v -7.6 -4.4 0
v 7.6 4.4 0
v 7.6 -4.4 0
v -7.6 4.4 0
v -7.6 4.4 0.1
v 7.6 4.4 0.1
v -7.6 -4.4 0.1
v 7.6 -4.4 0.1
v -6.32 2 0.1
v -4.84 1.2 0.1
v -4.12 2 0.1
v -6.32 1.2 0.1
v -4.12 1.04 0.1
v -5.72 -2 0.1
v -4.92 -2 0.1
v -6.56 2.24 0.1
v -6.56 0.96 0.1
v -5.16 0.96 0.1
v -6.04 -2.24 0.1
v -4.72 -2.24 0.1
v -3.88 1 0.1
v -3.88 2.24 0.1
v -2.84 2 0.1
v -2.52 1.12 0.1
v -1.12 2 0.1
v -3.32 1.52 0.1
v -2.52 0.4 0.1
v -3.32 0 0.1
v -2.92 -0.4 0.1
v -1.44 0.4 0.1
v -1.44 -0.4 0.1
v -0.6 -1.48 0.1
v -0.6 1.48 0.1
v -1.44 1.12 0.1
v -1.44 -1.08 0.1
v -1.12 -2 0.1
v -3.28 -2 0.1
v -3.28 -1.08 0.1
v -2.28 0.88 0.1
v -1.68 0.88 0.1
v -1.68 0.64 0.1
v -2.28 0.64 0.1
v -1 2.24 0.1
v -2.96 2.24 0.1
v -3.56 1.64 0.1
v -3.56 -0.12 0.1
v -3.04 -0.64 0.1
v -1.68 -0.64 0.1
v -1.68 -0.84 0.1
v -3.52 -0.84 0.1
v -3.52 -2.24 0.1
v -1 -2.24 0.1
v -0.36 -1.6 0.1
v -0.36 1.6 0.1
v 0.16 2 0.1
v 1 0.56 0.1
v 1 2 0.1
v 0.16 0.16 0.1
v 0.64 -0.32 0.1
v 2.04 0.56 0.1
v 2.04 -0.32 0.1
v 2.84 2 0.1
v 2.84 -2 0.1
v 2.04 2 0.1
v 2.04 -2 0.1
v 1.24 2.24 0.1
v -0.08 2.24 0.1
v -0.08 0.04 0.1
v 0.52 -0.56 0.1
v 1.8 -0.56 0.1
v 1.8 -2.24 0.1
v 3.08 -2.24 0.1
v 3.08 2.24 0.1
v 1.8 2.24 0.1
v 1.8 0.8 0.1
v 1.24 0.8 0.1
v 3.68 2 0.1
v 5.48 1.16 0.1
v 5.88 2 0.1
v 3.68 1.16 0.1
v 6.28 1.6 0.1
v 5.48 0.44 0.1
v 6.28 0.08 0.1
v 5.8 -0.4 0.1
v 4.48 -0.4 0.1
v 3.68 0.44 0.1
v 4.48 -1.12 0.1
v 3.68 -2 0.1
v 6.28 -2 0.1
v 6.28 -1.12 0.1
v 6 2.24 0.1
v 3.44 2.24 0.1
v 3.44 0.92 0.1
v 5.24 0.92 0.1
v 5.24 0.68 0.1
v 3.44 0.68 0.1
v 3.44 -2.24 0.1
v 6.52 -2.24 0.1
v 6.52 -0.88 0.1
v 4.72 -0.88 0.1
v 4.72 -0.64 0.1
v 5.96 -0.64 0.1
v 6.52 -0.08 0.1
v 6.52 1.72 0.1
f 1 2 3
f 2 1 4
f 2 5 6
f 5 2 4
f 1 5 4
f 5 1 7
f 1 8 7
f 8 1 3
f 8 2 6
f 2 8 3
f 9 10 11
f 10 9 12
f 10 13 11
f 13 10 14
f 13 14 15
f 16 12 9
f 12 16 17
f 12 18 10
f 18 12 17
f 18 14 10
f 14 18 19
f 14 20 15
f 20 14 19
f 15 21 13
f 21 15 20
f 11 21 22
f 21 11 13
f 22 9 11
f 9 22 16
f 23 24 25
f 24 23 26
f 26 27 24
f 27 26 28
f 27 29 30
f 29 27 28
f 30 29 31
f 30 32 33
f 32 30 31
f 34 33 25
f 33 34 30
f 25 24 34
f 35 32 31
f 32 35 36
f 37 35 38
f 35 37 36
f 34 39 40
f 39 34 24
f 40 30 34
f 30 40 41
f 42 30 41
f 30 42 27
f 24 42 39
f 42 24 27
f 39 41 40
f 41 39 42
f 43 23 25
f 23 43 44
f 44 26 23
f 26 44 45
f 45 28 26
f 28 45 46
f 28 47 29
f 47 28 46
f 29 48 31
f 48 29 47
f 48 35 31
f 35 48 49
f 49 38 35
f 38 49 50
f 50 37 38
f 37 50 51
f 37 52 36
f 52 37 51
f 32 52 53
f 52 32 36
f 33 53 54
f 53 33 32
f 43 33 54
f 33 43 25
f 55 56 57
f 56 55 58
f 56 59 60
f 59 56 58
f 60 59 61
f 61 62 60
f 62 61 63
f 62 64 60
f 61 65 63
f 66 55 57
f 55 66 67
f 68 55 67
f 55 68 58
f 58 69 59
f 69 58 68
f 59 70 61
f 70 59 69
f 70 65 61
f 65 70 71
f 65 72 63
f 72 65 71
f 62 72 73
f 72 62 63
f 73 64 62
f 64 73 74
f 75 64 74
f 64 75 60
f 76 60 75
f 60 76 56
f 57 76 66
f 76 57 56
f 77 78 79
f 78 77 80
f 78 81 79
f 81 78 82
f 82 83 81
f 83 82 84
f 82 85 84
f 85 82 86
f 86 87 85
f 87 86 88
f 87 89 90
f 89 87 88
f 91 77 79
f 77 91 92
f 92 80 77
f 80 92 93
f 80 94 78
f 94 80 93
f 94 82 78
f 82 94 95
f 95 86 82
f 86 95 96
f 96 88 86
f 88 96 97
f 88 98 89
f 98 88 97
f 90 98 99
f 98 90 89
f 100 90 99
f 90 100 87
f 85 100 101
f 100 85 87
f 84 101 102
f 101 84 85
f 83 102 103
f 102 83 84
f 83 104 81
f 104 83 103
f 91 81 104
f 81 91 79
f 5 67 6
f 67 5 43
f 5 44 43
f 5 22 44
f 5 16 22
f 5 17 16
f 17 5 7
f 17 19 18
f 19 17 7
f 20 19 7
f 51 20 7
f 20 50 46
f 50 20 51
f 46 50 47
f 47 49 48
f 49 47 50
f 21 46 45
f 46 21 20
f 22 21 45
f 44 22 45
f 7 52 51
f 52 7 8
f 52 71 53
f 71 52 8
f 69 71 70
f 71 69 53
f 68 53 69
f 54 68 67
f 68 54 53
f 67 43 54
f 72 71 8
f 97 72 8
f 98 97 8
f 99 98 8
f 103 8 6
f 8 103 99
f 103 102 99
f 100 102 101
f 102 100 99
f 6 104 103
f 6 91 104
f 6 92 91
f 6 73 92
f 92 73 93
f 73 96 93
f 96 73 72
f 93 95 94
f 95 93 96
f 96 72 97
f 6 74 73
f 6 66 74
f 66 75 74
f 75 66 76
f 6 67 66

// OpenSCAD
// file: ../p/box5-12.scad
use <../lib.scad>
function ldraw_lib__box5_12() = [
// 0 Box with 5 Faces without Any Edges
// 0 Name: box5-12.dat
// 0 Author: Chris Dee [cwdee]
// 0 !LDRAW_ORG Primitive UPDATE 2009-02
// 0 !LICENSE Licensed under CC BY 4.0 : see CAreadme.txt
// 
// 0 BFC CERTIFY CCW
  [0,"BFC","CERTIFY"],
  [0,"BFC","CCW"],
// 
// 0 !HISTORY 2009-09-03 [PTadmin] Official Update 2009-02
// 
// 
// 4 16 1 1 1 1 1 -1 -1 1 -1 -1 1 1
  [4,16,1,1,1,1,1,-1,-1,1,-1,-1,1,1],
// 4 16 -1 0 1 1 0 1 1 1 1 -1 1 1
  [4,16,-1,0,1,1,0,1,1,1,1,-1,1,1],
// 4 16 -1 0 -1 -1 0 1 -1 1 1 -1 1 -1
  [4,16,-1,0,-1,-1,0,1,-1,1,1,-1,1,-1],
// 4 16 1 0 -1 -1 0 -1 -1 1 -1 1 1 -1
  [4,16,1,0,-1,-1,0,-1,-1,1,-1,1,1,-1],
// 4 16 1 0 1 1 0 -1 1 1 -1 1 1 1
  [4,16,1,0,1,1,0,-1,1,1,-1,1,1,1],
// 0
];
module ldraw_lib__box5_12(step=0, col=false, unit=2/5, alt=false, line=0.2, solid=!$preview)
    makepoly(ldraw_lib__box5_12(), step=step, col=col, unit=unit, alt=alt, line=line, solid=solid);
ldraw_lib__box5_12(line=0.2);
// main file
use <../lib.scad>
use <../p/box5-12.scad>
function ldraw_lib__4500817c() = [
// 0 Sticker  1.1 x  1.9 with White "7942" on Red Background
// 0 Name: 4500817c.dat
// 0 Author: Takeshi Takahashi [RainbowDolphin]
// 0 !LDRAW_ORG Part UPDATE 2025-05
// 0 !LICENSE Licensed under CC BY 4.0 : see CAreadme.txt
// 
// 0 BFC CERTIFY CCW
  [0,"BFC","CERTIFY"],
  [0,"BFC","CCW"],
// 
// 0 !KEYWORDS Fire car, Offroader, Pickup, Set 7942, truck
// 
// 0 !HISTORY 2025-05-28 [OrionP] Official Update 2025-05
// 
// 
// 1 16 0 -0.25 0 19 0 0 0 0.25 0 0 0 11 box5-12.dat
  [1,16,0,-0.25,0,19,0,0,0,0.25,0,0,0,11, ldraw_lib__box5_12()],
// 4 15 -15.8 -0.25 5 -15.8 -0.25 3 -12.1 -0.25 3 -10.3 -0.25 5
  [4,15,-15.8,-0.25,5,-15.8,-0.25,3,-12.1,-0.25,3,-10.3,-0.25,5],
// 4 15 -10.3 -0.25 2.6 -10.3 -0.25 5 -12.1 -0.25 3 -14.3 -0.25 -5
  [4,15,-10.3,-0.25,2.6,-10.3,-0.25,5,-12.1,-0.25,3,-14.3,-0.25,-5],
// 3 15 -10.3 -0.25 2.6 -14.3 -0.25 -5 -12.3 -0.25 -5
  [3,15,-10.3,-0.25,2.6,-14.3,-0.25,-5,-12.3,-0.25,-5],
// 4 0 -15.8 -0.25 3 -15.8 -0.25 5 -16.4 -0.25 5.6 -16.4 -0.25 2.4
  [4,0,-15.8,-0.25,3,-15.8,-0.25,5,-16.4,-0.25,5.6,-16.4,-0.25,2.4],
// 4 0 -15.8 -0.25 3 -16.4 -0.25 2.4 -12.9 -0.25 2.4 -12.1 -0.25 3
  [4,0,-15.8,-0.25,3,-16.4,-0.25,2.4,-12.9,-0.25,2.4,-12.1,-0.25,3],
// 4 0 -14.3 -0.25 -5 -12.1 -0.25 3 -12.9 -0.25 2.4 -15.1 -0.25 -5.6
  [4,0,-14.3,-0.25,-5,-12.1,-0.25,3,-12.9,-0.25,2.4,-15.1,-0.25,-5.6],
// 4 0 -12.3 -0.25 -5 -14.3 -0.25 -5 -15.1 -0.25 -5.6 -11.8 -0.25 -5.6
  [4,0,-12.3,-0.25,-5,-14.3,-0.25,-5,-15.1,-0.25,-5.6,-11.8,-0.25,-5.6],
// 4 0 -10.3 -0.25 2.6 -12.3 -0.25 -5 -11.8 -0.25 -5.6 -9.7 -0.25 2.5
  [4,0,-10.3,-0.25,2.6,-12.3,-0.25,-5,-11.8,-0.25,-5.6,-9.7,-0.25,2.5],
// 4 0 -10.3 -0.25 5 -10.3 -0.25 2.6 -9.7 -0.25 2.5 -9.7 -0.25 5.6
  [4,0,-10.3,-0.25,5,-10.3,-0.25,2.6,-9.7,-0.25,2.5,-9.7,-0.25,5.6],
// 4 0 -10.3 -0.25 5 -9.7 -0.25 5.6 -16.4 -0.25 5.6 -15.8 -0.25 5
  [4,0,-10.3,-0.25,5,-9.7,-0.25,5.6,-16.4,-0.25,5.6,-15.8,-0.25,5],
// 4 15 -6.3 -0.25 2.8 -2.8 -0.25 5 -7.1 -0.25 5 -8.3 -0.25 3.8
  [4,15,-6.3,-0.25,2.8,-2.8,-0.25,5,-7.1,-0.25,5,-8.3,-0.25,3.8],
// 4 15 -6.3 -0.25 1 -6.3 -0.25 2.8 -8.3 -0.25 3.8 -8.3 -0.25 0
  [4,15,-6.3,-0.25,1,-6.3,-0.25,2.8,-8.3,-0.25,3.8,-8.3,-0.25,0],
// 4 15 -6.3 -0.25 1 -8.3 -0.25 0 -7.3 -0.25 -1 -3.6 -0.25 1
  [4,15,-6.3,-0.25,1,-8.3,-0.25,0,-7.3,-0.25,-1,-3.6,-0.25,1],
// 3 15 -3.6 -0.25 1 -7.3 -0.25 -1 -3.6 -0.25 -1
  [3,15,-3.6,-0.25,1,-7.3,-0.25,-1,-3.6,-0.25,-1],
// 4 15 -1.5 -0.25 3.7 -3.6 -0.25 1 -3.6 -0.25 -1 -1.5 -0.25 -3.7
  [4,15,-1.5,-0.25,3.7,-3.6,-0.25,1,-3.6,-0.25,-1,-1.5,-0.25,-3.7],
// 4 15 -3.6 -0.25 2.8 -3.6 -0.25 1 -1.5 -0.25 3.7 -2.8 -0.25 5
  [4,15,-3.6,-0.25,2.8,-3.6,-0.25,1,-1.5,-0.25,3.7,-2.8,-0.25,5],
// 3 15 -2.8 -0.25 5 -6.3 -0.25 2.8 -3.6 -0.25 2.8
  [3,15,-2.8,-0.25,5,-6.3,-0.25,2.8,-3.6,-0.25,2.8],
// 4 15 -1.5 -0.25 -3.7 -3.6 -0.25 -1 -3.6 -0.25 -2.7 -2.8 -0.25 -5
  [4,15,-1.5,-0.25,-3.7,-3.6,-0.25,-1,-3.6,-0.25,-2.7,-2.8,-0.25,-5],
// 4 15 -8.2 -0.25 -5 -2.8 -0.25 -5 -3.6 -0.25 -2.7 -8.2 -0.25 -2.7
  [4,15,-8.2,-0.25,-5,-2.8,-0.25,-5,-3.6,-0.25,-2.7,-8.2,-0.25,-2.7],
// 4 0 -3.6 -0.25 2.8 -6.3 -0.25 2.8 -5.7 -0.25 2.2 -4.2 -0.25 2.2
  [4,0,-3.6,-0.25,2.8,-6.3,-0.25,2.8,-5.7,-0.25,2.2,-4.2,-0.25,2.2],
// 4 0 -3.6 -0.25 1 -3.6 -0.25 2.8 -4.2 -0.25 2.2 -4.2 -0.25 1.6
  [4,0,-3.6,-0.25,1,-3.6,-0.25,2.8,-4.2,-0.25,2.2,-4.2,-0.25,1.6],
// 4 0 -6.3 -0.25 1 -3.6 -0.25 1 -4.2 -0.25 1.6 -5.7 -0.25 1.6
  [4,0,-6.3,-0.25,1,-3.6,-0.25,1,-4.2,-0.25,1.6,-5.7,-0.25,1.6],
// 4 0 -6.3 -0.25 1 -5.7 -0.25 1.6 -5.7 -0.25 2.2 -6.3 -0.25 2.8
  [4,0,-6.3,-0.25,1,-5.7,-0.25,1.6,-5.7,-0.25,2.2,-6.3,-0.25,2.8],
// 4 4 -4.2 -0.25 2.2 -5.7 -0.25 2.2 -5.7 -0.25 1.6 -4.2 -0.25 1.6
  [4,4,-4.2,-0.25,2.2,-5.7,-0.25,2.2,-5.7,-0.25,1.6,-4.2,-0.25,1.6],
// 4 0 -7.1 -0.25 5 -2.8 -0.25 5 -2.5 -0.25 5.6 -7.4 -0.25 5.6
  [4,0,-7.1,-0.25,5,-2.8,-0.25,5,-2.5,-0.25,5.6,-7.4,-0.25,5.6],
// 4 0 -8.3 -0.25 3.8 -7.1 -0.25 5 -7.4 -0.25 5.6 -8.9 -0.25 4.1
  [4,0,-8.3,-0.25,3.8,-7.1,-0.25,5,-7.4,-0.25,5.6,-8.9,-0.25,4.1],
// 4 0 -8.3 -0.25 0 -8.3 -0.25 3.8 -8.9 -0.25 4.1 -8.9 -0.25 -0.3
  [4,0,-8.3,-0.25,0,-8.3,-0.25,3.8,-8.9,-0.25,4.1,-8.9,-0.25,-0.3],
// 4 0 -7.3 -0.25 -1 -8.3 -0.25 0 -8.9 -0.25 -0.3 -7.6 -0.25 -1.6
  [4,0,-7.3,-0.25,-1,-8.3,-0.25,0,-8.9,-0.25,-0.3,-7.6,-0.25,-1.6],
// 4 0 -3.6 -0.25 -1 -7.3 -0.25 -1 -7.6 -0.25 -1.6 -4.2 -0.25 -1.6
  [4,0,-3.6,-0.25,-1,-7.3,-0.25,-1,-7.6,-0.25,-1.6,-4.2,-0.25,-1.6],
// 4 0 -3.6 -0.25 -2.7 -3.6 -0.25 -1 -4.2 -0.25 -1.6 -4.2 -0.25 -2.1
  [4,0,-3.6,-0.25,-2.7,-3.6,-0.25,-1,-4.2,-0.25,-1.6,-4.2,-0.25,-2.1],
// 4 0 -8.2 -0.25 -2.7 -3.6 -0.25 -2.7 -4.2 -0.25 -2.1 -8.8 -0.25 -2.1
  [4,0,-8.2,-0.25,-2.7,-3.6,-0.25,-2.7,-4.2,-0.25,-2.1,-8.8,-0.25,-2.1],
// 4 0 -8.2 -0.25 -5 -8.2 -0.25 -2.7 -8.8 -0.25 -2.1 -8.8 -0.25 -5.6
  [4,0,-8.2,-0.25,-5,-8.2,-0.25,-2.7,-8.8,-0.25,-2.1,-8.8,-0.25,-5.6],
// 4 0 -2.8 -0.25 -5 -8.2 -0.25 -5 -8.8 -0.25 -5.6 -2.5 -0.25 -5.6
  [4,0,-2.8,-0.25,-5,-8.2,-0.25,-5,-8.8,-0.25,-5.6,-2.5,-0.25,-5.6],
// 4 0 -1.5 -0.25 -3.7 -2.8 -0.25 -5 -2.5 -0.25 -5.6 -0.9 -0.25 -4
  [4,0,-1.5,-0.25,-3.7,-2.8,-0.25,-5,-2.5,-0.25,-5.6,-0.9,-0.25,-4],
// 4 0 -1.5 -0.25 3.7 -1.5 -0.25 -3.7 -0.9 -0.25 -4 -0.9 -0.25 4
  [4,0,-1.5,-0.25,3.7,-1.5,-0.25,-3.7,-0.9,-0.25,-4,-0.9,-0.25,4],
// 4 0 -1.5 -0.25 3.7 -0.9 -0.25 4 -2.5 -0.25 5.6 -2.8 -0.25 5
  [4,0,-1.5,-0.25,3.7,-0.9,-0.25,4,-2.5,-0.25,5.6,-2.8,-0.25,5],
// 4 15 2.5 -0.25 1.4 2.5 -0.25 5 0.4 -0.25 5 0.4 -0.25 0.4
  [4,15,2.5,-0.25,1.4,2.5,-0.25,5,0.4,-0.25,5,0.4,-0.25,0.4],
// 4 15 2.5 -0.25 1.4 0.4 -0.25 0.4 1.6 -0.25 -0.8 5.1 -0.25 1.4
  [4,15,2.5,-0.25,1.4,0.4,-0.25,0.4,1.6,-0.25,-0.8,5.1,-0.25,1.4],
// 3 15 5.1 -0.25 1.4 1.6 -0.25 -0.8 5.1 -0.25 -0.8
  [3,15,5.1,-0.25,1.4,1.6,-0.25,-0.8,5.1,-0.25,-0.8],
// 4 15 7.1 -0.25 5 5.1 -0.25 1.4 5.1 -0.25 -0.8 7.1 -0.25 -5
  [4,15,7.1,-0.25,5,5.1,-0.25,1.4,5.1,-0.25,-0.8,7.1,-0.25,-5],
// 3 15 7.1 -0.25 5 5.1 -0.25 5 5.1 -0.25 1.4
  [3,15,7.1,-0.25,5,5.1,-0.25,5,5.1,-0.25,1.4],
// 3 15 5.1 -0.25 -0.8 5.1 -0.25 -5 7.1 -0.25 -5
  [3,15,5.1,-0.25,-0.8,5.1,-0.25,-5,7.1,-0.25,-5],
// 4 0 -0.2 -0.25 5.6 0.4 -0.25 5 2.5 -0.25 5 3.1 -0.25 5.6
  [4,0,-0.2,-0.25,5.6,0.4,-0.25,5,2.5,-0.25,5,3.1,-0.25,5.6],
// 4 0 0.4 -0.25 0.4 0.4 -0.25 5 -0.2 -0.25 5.6 -0.2 -0.25 0.1
  [4,0,0.4,-0.25,0.4,0.4,-0.25,5,-0.2,-0.25,5.6,-0.2,-0.25,0.1],
// 4 0 1.6 -0.25 -0.8 0.4 -0.25 0.4 -0.2 -0.25 0.1 1.3 -0.25 -1.4
  [4,0,1.6,-0.25,-0.8,0.4,-0.25,0.4,-0.2,-0.25,0.1,1.3,-0.25,-1.4],
// 4 0 5.1 -0.25 -0.8 1.6 -0.25 -0.8 1.3 -0.25 -1.4 4.5 -0.25 -1.4
  [4,0,5.1,-0.25,-0.8,1.6,-0.25,-0.8,1.3,-0.25,-1.4,4.5,-0.25,-1.4],
// 4 0 5.1 -0.25 -5 5.1 -0.25 -0.8 4.5 -0.25 -1.4 4.5 -0.25 -5.6
  [4,0,5.1,-0.25,-5,5.1,-0.25,-0.8,4.5,-0.25,-1.4,4.5,-0.25,-5.6],
// 4 0 7.1 -0.25 -5 5.1 -0.25 -5 4.5 -0.25 -5.6 7.7 -0.25 -5.6
  [4,0,7.1,-0.25,-5,5.1,-0.25,-5,4.5,-0.25,-5.6,7.7,-0.25,-5.6],
// 4 0 7.1 -0.25 5 7.1 -0.25 -5 7.7 -0.25 -5.6 7.7 -0.25 5.6
  [4,0,7.1,-0.25,5,7.1,-0.25,-5,7.7,-0.25,-5.6,7.7,-0.25,5.6],
// 4 0 5.1 -0.25 5 7.1 -0.25 5 7.7 -0.25 5.6 4.5 -0.25 5.6
  [4,0,5.1,-0.25,5,7.1,-0.25,5,7.7,-0.25,5.6,4.5,-0.25,5.6],
// 4 0 5.1 -0.25 1.4 5.1 -0.25 5 4.5 -0.25 5.6 4.5 -0.25 2
  [4,0,5.1,-0.25,1.4,5.1,-0.25,5,4.5,-0.25,5.6,4.5,-0.25,2],
// 4 0 2.5 -0.25 1.4 5.1 -0.25 1.4 4.5 -0.25 2 3.1 -0.25 2
  [4,0,2.5,-0.25,1.4,5.1,-0.25,1.4,4.5,-0.25,2,3.1,-0.25,2],
// 4 0 2.5 -0.25 5 2.5 -0.25 1.4 3.1 -0.25 2 3.1 -0.25 5.6
  [4,0,2.5,-0.25,5,2.5,-0.25,1.4,3.1,-0.25,2,3.1,-0.25,5.6],
// 4 15 9.2 -0.25 5 9.2 -0.25 2.9 13.7 -0.25 2.9 14.7 -0.25 5
  [4,15,9.2,-0.25,5,9.2,-0.25,2.9,13.7,-0.25,2.9,14.7,-0.25,5],
// 4 15 15.7 -0.25 4 14.7 -0.25 5 13.7 -0.25 2.9 13.7 -0.25 1.1
  [4,15,15.7,-0.25,4,14.7,-0.25,5,13.7,-0.25,2.9,13.7,-0.25,1.1],
// 4 15 15.7 -0.25 0.2 15.7 -0.25 4 13.7 -0.25 1.1 14.5 -0.25 -1
  [4,15,15.7,-0.25,0.2,15.7,-0.25,4,13.7,-0.25,1.1,14.5,-0.25,-1],
// 4 15 14.5 -0.25 -1 13.7 -0.25 1.1 9.2 -0.25 1.1 11.2 -0.25 -1
  [4,15,14.5,-0.25,-1,13.7,-0.25,1.1,9.2,-0.25,1.1,11.2,-0.25,-1],
// 4 15 11.2 -0.25 -1 9.2 -0.25 1.1 9.2 -0.25 -5 11.2 -0.25 -2.8
  [4,15,11.2,-0.25,-1,9.2,-0.25,1.1,9.2,-0.25,-5,11.2,-0.25,-2.8],
// 4 15 11.2 -0.25 -2.8 9.2 -0.25 -5 15.7 -0.25 -5 15.7 -0.25 -2.8
  [4,15,11.2,-0.25,-2.8,9.2,-0.25,-5,15.7,-0.25,-5,15.7,-0.25,-2.8],
// 4 0 8.6 -0.25 5.6 9.2 -0.25 5 14.7 -0.25 5 15 -0.25 5.6
  [4,0,8.6,-0.25,5.6,9.2,-0.25,5,14.7,-0.25,5,15,-0.25,5.6],
// 4 0 9.2 -0.25 2.9 9.2 -0.25 5 8.6 -0.25 5.6 8.6 -0.25 2.3
  [4,0,9.2,-0.25,2.9,9.2,-0.25,5,8.6,-0.25,5.6,8.6,-0.25,2.3],
// 4 0 13.7 -0.25 2.9 9.2 -0.25 2.9 8.6 -0.25 2.3 13.1 -0.25 2.3
  [4,0,13.7,-0.25,2.9,9.2,-0.25,2.9,8.6,-0.25,2.3,13.1,-0.25,2.3],
// 4 0 13.7 -0.25 1.1 13.7 -0.25 2.9 13.1 -0.25 2.3 13.1 -0.25 1.7
  [4,0,13.7,-0.25,1.1,13.7,-0.25,2.9,13.1,-0.25,2.3,13.1,-0.25,1.7],
// 4 0 9.2 -0.25 1.1 13.7 -0.25 1.1 13.1 -0.25 1.7 8.6 -0.25 1.7
  [4,0,9.2,-0.25,1.1,13.7,-0.25,1.1,13.1,-0.25,1.7,8.6,-0.25,1.7],
// 4 0 9.2 -0.25 -5 9.2 -0.25 1.1 8.6 -0.25 1.7 8.6 -0.25 -5.6
  [4,0,9.2,-0.25,-5,9.2,-0.25,1.1,8.6,-0.25,1.7,8.6,-0.25,-5.6],
// 4 0 15.7 -0.25 -5 9.2 -0.25 -5 8.6 -0.25 -5.6 16.3 -0.25 -5.6
  [4,0,15.7,-0.25,-5,9.2,-0.25,-5,8.6,-0.25,-5.6,16.3,-0.25,-5.6],
// 4 0 15.7 -0.25 -2.8 15.7 -0.25 -5 16.3 -0.25 -5.6 16.3 -0.25 -2.2
  [4,0,15.7,-0.25,-2.8,15.7,-0.25,-5,16.3,-0.25,-5.6,16.3,-0.25,-2.2],
// 4 0 11.2 -0.25 -2.8 15.7 -0.25 -2.8 16.3 -0.25 -2.2 11.8 -0.25 -2.2
  [4,0,11.2,-0.25,-2.8,15.7,-0.25,-2.8,16.3,-0.25,-2.2,11.8,-0.25,-2.2],
// 4 0 11.2 -0.25 -1 11.2 -0.25 -2.8 11.8 -0.25 -2.2 11.8 -0.25 -1.6
  [4,0,11.2,-0.25,-1,11.2,-0.25,-2.8,11.8,-0.25,-2.2,11.8,-0.25,-1.6],
// 4 0 14.5 -0.25 -1 11.2 -0.25 -1 11.8 -0.25 -1.6 14.9 -0.25 -1.6
  [4,0,14.5,-0.25,-1,11.2,-0.25,-1,11.8,-0.25,-1.6,14.9,-0.25,-1.6],
// 4 0 15.7 -0.25 0.2 14.5 -0.25 -1 14.9 -0.25 -1.6 16.3 -0.25 -0.2
  [4,0,15.7,-0.25,0.2,14.5,-0.25,-1,14.9,-0.25,-1.6,16.3,-0.25,-0.2],
// 4 0 15.7 -0.25 4 15.7 -0.25 0.2 16.3 -0.25 -0.2 16.3 -0.25 4.3
  [4,0,15.7,-0.25,4,15.7,-0.25,0.2,16.3,-0.25,-0.2,16.3,-0.25,4.3],
// 4 0 14.7 -0.25 5 15.7 -0.25 4 16.3 -0.25 4.3 15 -0.25 5.6
  [4,0,14.7,-0.25,5,15.7,-0.25,4,16.3,-0.25,4.3,15,-0.25,5.6],
// 4 4 -0.2 -0.25 5.6 19 -0.25 11 -19 -0.25 11 -2.5 -0.25 5.6
  [4,4,-0.2,-0.25,5.6,19,-0.25,11,-19,-0.25,11,-2.5,-0.25,5.6],
// 3 4 -19 -0.25 11 -7.4 -0.25 5.6 -2.5 -0.25 5.6
  [3,4,-19,-0.25,11,-7.4,-0.25,5.6,-2.5,-0.25,5.6],
// 3 4 -19 -0.25 11 -9.7 -0.25 5.6 -7.4 -0.25 5.6
  [3,4,-19,-0.25,11,-9.7,-0.25,5.6,-7.4,-0.25,5.6],
// 3 4 -19 -0.25 11 -16.4 -0.25 5.6 -9.7 -0.25 5.6
  [3,4,-19,-0.25,11,-16.4,-0.25,5.6,-9.7,-0.25,5.6],
// 4 4 -16.4 -0.25 2.4 -16.4 -0.25 5.6 -19 -0.25 11 -19 -0.25 -11
  [4,4,-16.4,-0.25,2.4,-16.4,-0.25,5.6,-19,-0.25,11,-19,-0.25,-11],
// 4 4 -16.4 -0.25 2.4 -19 -0.25 -11 -15.1 -0.25 -5.6 -12.9 -0.25 2.4
  [4,4,-16.4,-0.25,2.4,-19,-0.25,-11,-15.1,-0.25,-5.6,-12.9,-0.25,2.4],
// 3 4 -11.8 -0.25 -5.6 -15.1 -0.25 -5.6 -19 -0.25 -11
  [3,4,-11.8,-0.25,-5.6,-15.1,-0.25,-5.6,-19,-0.25,-11],
// 3 4 -8.8 -0.25 -5.6 -11.8 -0.25 -5.6 -19 -0.25 -11
  [3,4,-8.8,-0.25,-5.6,-11.8,-0.25,-5.6,-19,-0.25,-11],
// 4 4 -11.8 -0.25 -5.6 -8.8 -0.25 -5.6 -8.8 -0.25 -2.1 -8.9 -0.25 -0.3
  [4,4,-11.8,-0.25,-5.6,-8.8,-0.25,-5.6,-8.8,-0.25,-2.1,-8.9,-0.25,-0.3],
// 3 4 -8.9 -0.25 -0.3 -8.8 -0.25 -2.1 -7.6 -0.25 -1.6
  [3,4,-8.9,-0.25,-0.3,-8.8,-0.25,-2.1,-7.6,-0.25,-1.6],
// 4 4 -7.6 -0.25 -1.6 -8.8 -0.25 -2.1 -4.2 -0.25 -2.1 -4.2 -0.25 -1.6
  [4,4,-7.6,-0.25,-1.6,-8.8,-0.25,-2.1,-4.2,-0.25,-2.1,-4.2,-0.25,-1.6],
// 4 4 -9.7 -0.25 2.5 -11.8 -0.25 -5.6 -8.9 -0.25 -0.3 -8.9 -0.25 4.1
  [4,4,-9.7,-0.25,2.5,-11.8,-0.25,-5.6,-8.9,-0.25,-0.3,-8.9,-0.25,4.1],
// 3 4 -9.7 -0.25 5.6 -9.7 -0.25 2.5 -8.9 -0.25 4.1
  [3,4,-9.7,-0.25,5.6,-9.7,-0.25,2.5,-8.9,-0.25,4.1],
// 3 4 -7.4 -0.25 5.6 -9.7 -0.25 5.6 -8.9 -0.25 4.1
  [3,4,-7.4,-0.25,5.6,-9.7,-0.25,5.6,-8.9,-0.25,4.1],
// 4 4 -2.5 -0.25 -5.6 -8.8 -0.25 -5.6 -19 -0.25 -11 19 -0.25 -11
  [4,4,-2.5,-0.25,-5.6,-8.8,-0.25,-5.6,-19,-0.25,-11,19,-0.25,-11],
// 4 4 -2.5 -0.25 -5.6 19 -0.25 -11 4.5 -0.25 -5.6 -0.9 -0.25 -4
  [4,4,-2.5,-0.25,-5.6,19,-0.25,-11,4.5,-0.25,-5.6,-0.9,-0.25,-4],
// 4 4 1.3 -0.25 -1.4 -0.9 -0.25 -4 4.5 -0.25 -5.6 4.5 -0.25 -1.4
  [4,4,1.3,-0.25,-1.4,-0.9,-0.25,-4,4.5,-0.25,-5.6,4.5,-0.25,-1.4],
// 3 4 -0.2 -0.25 0.1 -0.9 -0.25 -4 1.3 -0.25 -1.4
  [3,4,-0.2,-0.25,0.1,-0.9,-0.25,-4,1.3,-0.25,-1.4],
// 4 4 -0.9 -0.25 4 -0.9 -0.25 -4 -0.2 -0.25 0.1 -0.2 -0.25 5.6
  [4,4,-0.9,-0.25,4,-0.9,-0.25,-4,-0.2,-0.25,0.1,-0.2,-0.25,5.6],
// 3 4 -0.2 -0.25 5.6 -2.5 -0.25 5.6 -0.9 -0.25 4
  [3,4,-0.2,-0.25,5.6,-2.5,-0.25,5.6,-0.9,-0.25,4],
// 3 4 7.7 -0.25 -5.6 4.5 -0.25 -5.6 19 -0.25 -11
  [3,4,7.7,-0.25,-5.6,4.5,-0.25,-5.6,19,-0.25,-11],
// 3 4 8.6 -0.25 -5.6 7.7 -0.25 -5.6 19 -0.25 -11
  [3,4,8.6,-0.25,-5.6,7.7,-0.25,-5.6,19,-0.25,-11],
// 3 4 16.3 -0.25 -5.6 8.6 -0.25 -5.6 19 -0.25 -11
  [3,4,16.3,-0.25,-5.6,8.6,-0.25,-5.6,19,-0.25,-11],
// 3 4 16.3 -0.25 -2.2 16.3 -0.25 -5.6 19 -0.25 -11
  [3,4,16.3,-0.25,-2.2,16.3,-0.25,-5.6,19,-0.25,-11],
// 4 4 16.3 -0.25 -0.2 16.3 -0.25 -2.2 19 -0.25 -11 19 -0.25 11
  [4,4,16.3,-0.25,-0.2,16.3,-0.25,-2.2,19,-0.25,-11,19,-0.25,11],
// 3 4 16.3 -0.25 -0.2 14.9 -0.25 -1.6 16.3 -0.25 -2.2
  [3,4,16.3,-0.25,-0.2,14.9,-0.25,-1.6,16.3,-0.25,-2.2],
// 4 4 11.8 -0.25 -2.2 16.3 -0.25 -2.2 14.9 -0.25 -1.6 11.8 -0.25 -1.6
  [4,4,11.8,-0.25,-2.2,16.3,-0.25,-2.2,14.9,-0.25,-1.6,11.8,-0.25,-1.6],
// 3 4 19 -0.25 11 16.3 -0.25 4.3 16.3 -0.25 -0.2
  [3,4,19,-0.25,11,16.3,-0.25,4.3,16.3,-0.25,-0.2],
// 3 4 19 -0.25 11 15 -0.25 5.6 16.3 -0.25 4.3
  [3,4,19,-0.25,11,15,-0.25,5.6,16.3,-0.25,4.3],
// 3 4 19 -0.25 11 8.6 -0.25 5.6 15 -0.25 5.6
  [3,4,19,-0.25,11,8.6,-0.25,5.6,15,-0.25,5.6],
// 3 4 19 -0.25 11 7.7 -0.25 5.6 8.6 -0.25 5.6
  [3,4,19,-0.25,11,7.7,-0.25,5.6,8.6,-0.25,5.6],
// 3 4 8.6 -0.25 5.6 7.7 -0.25 5.6 8.6 -0.25 2.3
  [3,4,8.6,-0.25,5.6,7.7,-0.25,5.6,8.6,-0.25,2.3],
// 4 4 8.6 -0.25 1.7 8.6 -0.25 2.3 7.7 -0.25 5.6 7.7 -0.25 -5.6
  [4,4,8.6,-0.25,1.7,8.6,-0.25,2.3,7.7,-0.25,5.6,7.7,-0.25,-5.6],
// 4 4 8.6 -0.25 2.3 8.6 -0.25 1.7 13.1 -0.25 1.7 13.1 -0.25 2.3
  [4,4,8.6,-0.25,2.3,8.6,-0.25,1.7,13.1,-0.25,1.7,13.1,-0.25,2.3],
// 3 4 8.6 -0.25 1.7 7.7 -0.25 -5.6 8.6 -0.25 -5.6
  [3,4,8.6,-0.25,1.7,7.7,-0.25,-5.6,8.6,-0.25,-5.6],
// 3 4 19 -0.25 11 4.5 -0.25 5.6 7.7 -0.25 5.6
  [3,4,19,-0.25,11,4.5,-0.25,5.6,7.7,-0.25,5.6],
// 3 4 19 -0.25 11 3.1 -0.25 5.6 4.5 -0.25 5.6
  [3,4,19,-0.25,11,3.1,-0.25,5.6,4.5,-0.25,5.6],
// 4 4 4.5 -0.25 5.6 3.1 -0.25 5.6 3.1 -0.25 2 4.5 -0.25 2
  [4,4,4.5,-0.25,5.6,3.1,-0.25,5.6,3.1,-0.25,2,4.5,-0.25,2],
// 3 4 19 -0.25 11 -0.2 -0.25 5.6 3.1 -0.25 5.6
  [3,4,19,-0.25,11,-0.2,-0.25,5.6,3.1,-0.25,5.6],
];
module ldraw_lib__4500817c(step=0, col=false, unit=2/5, alt=false, line=0.2, solid=!$preview)
    makepoly(ldraw_lib__4500817c(), step=step, col=col, unit=unit, alt=alt, line=line, solid=solid);
ldraw_lib__4500817c(line=0.2);
